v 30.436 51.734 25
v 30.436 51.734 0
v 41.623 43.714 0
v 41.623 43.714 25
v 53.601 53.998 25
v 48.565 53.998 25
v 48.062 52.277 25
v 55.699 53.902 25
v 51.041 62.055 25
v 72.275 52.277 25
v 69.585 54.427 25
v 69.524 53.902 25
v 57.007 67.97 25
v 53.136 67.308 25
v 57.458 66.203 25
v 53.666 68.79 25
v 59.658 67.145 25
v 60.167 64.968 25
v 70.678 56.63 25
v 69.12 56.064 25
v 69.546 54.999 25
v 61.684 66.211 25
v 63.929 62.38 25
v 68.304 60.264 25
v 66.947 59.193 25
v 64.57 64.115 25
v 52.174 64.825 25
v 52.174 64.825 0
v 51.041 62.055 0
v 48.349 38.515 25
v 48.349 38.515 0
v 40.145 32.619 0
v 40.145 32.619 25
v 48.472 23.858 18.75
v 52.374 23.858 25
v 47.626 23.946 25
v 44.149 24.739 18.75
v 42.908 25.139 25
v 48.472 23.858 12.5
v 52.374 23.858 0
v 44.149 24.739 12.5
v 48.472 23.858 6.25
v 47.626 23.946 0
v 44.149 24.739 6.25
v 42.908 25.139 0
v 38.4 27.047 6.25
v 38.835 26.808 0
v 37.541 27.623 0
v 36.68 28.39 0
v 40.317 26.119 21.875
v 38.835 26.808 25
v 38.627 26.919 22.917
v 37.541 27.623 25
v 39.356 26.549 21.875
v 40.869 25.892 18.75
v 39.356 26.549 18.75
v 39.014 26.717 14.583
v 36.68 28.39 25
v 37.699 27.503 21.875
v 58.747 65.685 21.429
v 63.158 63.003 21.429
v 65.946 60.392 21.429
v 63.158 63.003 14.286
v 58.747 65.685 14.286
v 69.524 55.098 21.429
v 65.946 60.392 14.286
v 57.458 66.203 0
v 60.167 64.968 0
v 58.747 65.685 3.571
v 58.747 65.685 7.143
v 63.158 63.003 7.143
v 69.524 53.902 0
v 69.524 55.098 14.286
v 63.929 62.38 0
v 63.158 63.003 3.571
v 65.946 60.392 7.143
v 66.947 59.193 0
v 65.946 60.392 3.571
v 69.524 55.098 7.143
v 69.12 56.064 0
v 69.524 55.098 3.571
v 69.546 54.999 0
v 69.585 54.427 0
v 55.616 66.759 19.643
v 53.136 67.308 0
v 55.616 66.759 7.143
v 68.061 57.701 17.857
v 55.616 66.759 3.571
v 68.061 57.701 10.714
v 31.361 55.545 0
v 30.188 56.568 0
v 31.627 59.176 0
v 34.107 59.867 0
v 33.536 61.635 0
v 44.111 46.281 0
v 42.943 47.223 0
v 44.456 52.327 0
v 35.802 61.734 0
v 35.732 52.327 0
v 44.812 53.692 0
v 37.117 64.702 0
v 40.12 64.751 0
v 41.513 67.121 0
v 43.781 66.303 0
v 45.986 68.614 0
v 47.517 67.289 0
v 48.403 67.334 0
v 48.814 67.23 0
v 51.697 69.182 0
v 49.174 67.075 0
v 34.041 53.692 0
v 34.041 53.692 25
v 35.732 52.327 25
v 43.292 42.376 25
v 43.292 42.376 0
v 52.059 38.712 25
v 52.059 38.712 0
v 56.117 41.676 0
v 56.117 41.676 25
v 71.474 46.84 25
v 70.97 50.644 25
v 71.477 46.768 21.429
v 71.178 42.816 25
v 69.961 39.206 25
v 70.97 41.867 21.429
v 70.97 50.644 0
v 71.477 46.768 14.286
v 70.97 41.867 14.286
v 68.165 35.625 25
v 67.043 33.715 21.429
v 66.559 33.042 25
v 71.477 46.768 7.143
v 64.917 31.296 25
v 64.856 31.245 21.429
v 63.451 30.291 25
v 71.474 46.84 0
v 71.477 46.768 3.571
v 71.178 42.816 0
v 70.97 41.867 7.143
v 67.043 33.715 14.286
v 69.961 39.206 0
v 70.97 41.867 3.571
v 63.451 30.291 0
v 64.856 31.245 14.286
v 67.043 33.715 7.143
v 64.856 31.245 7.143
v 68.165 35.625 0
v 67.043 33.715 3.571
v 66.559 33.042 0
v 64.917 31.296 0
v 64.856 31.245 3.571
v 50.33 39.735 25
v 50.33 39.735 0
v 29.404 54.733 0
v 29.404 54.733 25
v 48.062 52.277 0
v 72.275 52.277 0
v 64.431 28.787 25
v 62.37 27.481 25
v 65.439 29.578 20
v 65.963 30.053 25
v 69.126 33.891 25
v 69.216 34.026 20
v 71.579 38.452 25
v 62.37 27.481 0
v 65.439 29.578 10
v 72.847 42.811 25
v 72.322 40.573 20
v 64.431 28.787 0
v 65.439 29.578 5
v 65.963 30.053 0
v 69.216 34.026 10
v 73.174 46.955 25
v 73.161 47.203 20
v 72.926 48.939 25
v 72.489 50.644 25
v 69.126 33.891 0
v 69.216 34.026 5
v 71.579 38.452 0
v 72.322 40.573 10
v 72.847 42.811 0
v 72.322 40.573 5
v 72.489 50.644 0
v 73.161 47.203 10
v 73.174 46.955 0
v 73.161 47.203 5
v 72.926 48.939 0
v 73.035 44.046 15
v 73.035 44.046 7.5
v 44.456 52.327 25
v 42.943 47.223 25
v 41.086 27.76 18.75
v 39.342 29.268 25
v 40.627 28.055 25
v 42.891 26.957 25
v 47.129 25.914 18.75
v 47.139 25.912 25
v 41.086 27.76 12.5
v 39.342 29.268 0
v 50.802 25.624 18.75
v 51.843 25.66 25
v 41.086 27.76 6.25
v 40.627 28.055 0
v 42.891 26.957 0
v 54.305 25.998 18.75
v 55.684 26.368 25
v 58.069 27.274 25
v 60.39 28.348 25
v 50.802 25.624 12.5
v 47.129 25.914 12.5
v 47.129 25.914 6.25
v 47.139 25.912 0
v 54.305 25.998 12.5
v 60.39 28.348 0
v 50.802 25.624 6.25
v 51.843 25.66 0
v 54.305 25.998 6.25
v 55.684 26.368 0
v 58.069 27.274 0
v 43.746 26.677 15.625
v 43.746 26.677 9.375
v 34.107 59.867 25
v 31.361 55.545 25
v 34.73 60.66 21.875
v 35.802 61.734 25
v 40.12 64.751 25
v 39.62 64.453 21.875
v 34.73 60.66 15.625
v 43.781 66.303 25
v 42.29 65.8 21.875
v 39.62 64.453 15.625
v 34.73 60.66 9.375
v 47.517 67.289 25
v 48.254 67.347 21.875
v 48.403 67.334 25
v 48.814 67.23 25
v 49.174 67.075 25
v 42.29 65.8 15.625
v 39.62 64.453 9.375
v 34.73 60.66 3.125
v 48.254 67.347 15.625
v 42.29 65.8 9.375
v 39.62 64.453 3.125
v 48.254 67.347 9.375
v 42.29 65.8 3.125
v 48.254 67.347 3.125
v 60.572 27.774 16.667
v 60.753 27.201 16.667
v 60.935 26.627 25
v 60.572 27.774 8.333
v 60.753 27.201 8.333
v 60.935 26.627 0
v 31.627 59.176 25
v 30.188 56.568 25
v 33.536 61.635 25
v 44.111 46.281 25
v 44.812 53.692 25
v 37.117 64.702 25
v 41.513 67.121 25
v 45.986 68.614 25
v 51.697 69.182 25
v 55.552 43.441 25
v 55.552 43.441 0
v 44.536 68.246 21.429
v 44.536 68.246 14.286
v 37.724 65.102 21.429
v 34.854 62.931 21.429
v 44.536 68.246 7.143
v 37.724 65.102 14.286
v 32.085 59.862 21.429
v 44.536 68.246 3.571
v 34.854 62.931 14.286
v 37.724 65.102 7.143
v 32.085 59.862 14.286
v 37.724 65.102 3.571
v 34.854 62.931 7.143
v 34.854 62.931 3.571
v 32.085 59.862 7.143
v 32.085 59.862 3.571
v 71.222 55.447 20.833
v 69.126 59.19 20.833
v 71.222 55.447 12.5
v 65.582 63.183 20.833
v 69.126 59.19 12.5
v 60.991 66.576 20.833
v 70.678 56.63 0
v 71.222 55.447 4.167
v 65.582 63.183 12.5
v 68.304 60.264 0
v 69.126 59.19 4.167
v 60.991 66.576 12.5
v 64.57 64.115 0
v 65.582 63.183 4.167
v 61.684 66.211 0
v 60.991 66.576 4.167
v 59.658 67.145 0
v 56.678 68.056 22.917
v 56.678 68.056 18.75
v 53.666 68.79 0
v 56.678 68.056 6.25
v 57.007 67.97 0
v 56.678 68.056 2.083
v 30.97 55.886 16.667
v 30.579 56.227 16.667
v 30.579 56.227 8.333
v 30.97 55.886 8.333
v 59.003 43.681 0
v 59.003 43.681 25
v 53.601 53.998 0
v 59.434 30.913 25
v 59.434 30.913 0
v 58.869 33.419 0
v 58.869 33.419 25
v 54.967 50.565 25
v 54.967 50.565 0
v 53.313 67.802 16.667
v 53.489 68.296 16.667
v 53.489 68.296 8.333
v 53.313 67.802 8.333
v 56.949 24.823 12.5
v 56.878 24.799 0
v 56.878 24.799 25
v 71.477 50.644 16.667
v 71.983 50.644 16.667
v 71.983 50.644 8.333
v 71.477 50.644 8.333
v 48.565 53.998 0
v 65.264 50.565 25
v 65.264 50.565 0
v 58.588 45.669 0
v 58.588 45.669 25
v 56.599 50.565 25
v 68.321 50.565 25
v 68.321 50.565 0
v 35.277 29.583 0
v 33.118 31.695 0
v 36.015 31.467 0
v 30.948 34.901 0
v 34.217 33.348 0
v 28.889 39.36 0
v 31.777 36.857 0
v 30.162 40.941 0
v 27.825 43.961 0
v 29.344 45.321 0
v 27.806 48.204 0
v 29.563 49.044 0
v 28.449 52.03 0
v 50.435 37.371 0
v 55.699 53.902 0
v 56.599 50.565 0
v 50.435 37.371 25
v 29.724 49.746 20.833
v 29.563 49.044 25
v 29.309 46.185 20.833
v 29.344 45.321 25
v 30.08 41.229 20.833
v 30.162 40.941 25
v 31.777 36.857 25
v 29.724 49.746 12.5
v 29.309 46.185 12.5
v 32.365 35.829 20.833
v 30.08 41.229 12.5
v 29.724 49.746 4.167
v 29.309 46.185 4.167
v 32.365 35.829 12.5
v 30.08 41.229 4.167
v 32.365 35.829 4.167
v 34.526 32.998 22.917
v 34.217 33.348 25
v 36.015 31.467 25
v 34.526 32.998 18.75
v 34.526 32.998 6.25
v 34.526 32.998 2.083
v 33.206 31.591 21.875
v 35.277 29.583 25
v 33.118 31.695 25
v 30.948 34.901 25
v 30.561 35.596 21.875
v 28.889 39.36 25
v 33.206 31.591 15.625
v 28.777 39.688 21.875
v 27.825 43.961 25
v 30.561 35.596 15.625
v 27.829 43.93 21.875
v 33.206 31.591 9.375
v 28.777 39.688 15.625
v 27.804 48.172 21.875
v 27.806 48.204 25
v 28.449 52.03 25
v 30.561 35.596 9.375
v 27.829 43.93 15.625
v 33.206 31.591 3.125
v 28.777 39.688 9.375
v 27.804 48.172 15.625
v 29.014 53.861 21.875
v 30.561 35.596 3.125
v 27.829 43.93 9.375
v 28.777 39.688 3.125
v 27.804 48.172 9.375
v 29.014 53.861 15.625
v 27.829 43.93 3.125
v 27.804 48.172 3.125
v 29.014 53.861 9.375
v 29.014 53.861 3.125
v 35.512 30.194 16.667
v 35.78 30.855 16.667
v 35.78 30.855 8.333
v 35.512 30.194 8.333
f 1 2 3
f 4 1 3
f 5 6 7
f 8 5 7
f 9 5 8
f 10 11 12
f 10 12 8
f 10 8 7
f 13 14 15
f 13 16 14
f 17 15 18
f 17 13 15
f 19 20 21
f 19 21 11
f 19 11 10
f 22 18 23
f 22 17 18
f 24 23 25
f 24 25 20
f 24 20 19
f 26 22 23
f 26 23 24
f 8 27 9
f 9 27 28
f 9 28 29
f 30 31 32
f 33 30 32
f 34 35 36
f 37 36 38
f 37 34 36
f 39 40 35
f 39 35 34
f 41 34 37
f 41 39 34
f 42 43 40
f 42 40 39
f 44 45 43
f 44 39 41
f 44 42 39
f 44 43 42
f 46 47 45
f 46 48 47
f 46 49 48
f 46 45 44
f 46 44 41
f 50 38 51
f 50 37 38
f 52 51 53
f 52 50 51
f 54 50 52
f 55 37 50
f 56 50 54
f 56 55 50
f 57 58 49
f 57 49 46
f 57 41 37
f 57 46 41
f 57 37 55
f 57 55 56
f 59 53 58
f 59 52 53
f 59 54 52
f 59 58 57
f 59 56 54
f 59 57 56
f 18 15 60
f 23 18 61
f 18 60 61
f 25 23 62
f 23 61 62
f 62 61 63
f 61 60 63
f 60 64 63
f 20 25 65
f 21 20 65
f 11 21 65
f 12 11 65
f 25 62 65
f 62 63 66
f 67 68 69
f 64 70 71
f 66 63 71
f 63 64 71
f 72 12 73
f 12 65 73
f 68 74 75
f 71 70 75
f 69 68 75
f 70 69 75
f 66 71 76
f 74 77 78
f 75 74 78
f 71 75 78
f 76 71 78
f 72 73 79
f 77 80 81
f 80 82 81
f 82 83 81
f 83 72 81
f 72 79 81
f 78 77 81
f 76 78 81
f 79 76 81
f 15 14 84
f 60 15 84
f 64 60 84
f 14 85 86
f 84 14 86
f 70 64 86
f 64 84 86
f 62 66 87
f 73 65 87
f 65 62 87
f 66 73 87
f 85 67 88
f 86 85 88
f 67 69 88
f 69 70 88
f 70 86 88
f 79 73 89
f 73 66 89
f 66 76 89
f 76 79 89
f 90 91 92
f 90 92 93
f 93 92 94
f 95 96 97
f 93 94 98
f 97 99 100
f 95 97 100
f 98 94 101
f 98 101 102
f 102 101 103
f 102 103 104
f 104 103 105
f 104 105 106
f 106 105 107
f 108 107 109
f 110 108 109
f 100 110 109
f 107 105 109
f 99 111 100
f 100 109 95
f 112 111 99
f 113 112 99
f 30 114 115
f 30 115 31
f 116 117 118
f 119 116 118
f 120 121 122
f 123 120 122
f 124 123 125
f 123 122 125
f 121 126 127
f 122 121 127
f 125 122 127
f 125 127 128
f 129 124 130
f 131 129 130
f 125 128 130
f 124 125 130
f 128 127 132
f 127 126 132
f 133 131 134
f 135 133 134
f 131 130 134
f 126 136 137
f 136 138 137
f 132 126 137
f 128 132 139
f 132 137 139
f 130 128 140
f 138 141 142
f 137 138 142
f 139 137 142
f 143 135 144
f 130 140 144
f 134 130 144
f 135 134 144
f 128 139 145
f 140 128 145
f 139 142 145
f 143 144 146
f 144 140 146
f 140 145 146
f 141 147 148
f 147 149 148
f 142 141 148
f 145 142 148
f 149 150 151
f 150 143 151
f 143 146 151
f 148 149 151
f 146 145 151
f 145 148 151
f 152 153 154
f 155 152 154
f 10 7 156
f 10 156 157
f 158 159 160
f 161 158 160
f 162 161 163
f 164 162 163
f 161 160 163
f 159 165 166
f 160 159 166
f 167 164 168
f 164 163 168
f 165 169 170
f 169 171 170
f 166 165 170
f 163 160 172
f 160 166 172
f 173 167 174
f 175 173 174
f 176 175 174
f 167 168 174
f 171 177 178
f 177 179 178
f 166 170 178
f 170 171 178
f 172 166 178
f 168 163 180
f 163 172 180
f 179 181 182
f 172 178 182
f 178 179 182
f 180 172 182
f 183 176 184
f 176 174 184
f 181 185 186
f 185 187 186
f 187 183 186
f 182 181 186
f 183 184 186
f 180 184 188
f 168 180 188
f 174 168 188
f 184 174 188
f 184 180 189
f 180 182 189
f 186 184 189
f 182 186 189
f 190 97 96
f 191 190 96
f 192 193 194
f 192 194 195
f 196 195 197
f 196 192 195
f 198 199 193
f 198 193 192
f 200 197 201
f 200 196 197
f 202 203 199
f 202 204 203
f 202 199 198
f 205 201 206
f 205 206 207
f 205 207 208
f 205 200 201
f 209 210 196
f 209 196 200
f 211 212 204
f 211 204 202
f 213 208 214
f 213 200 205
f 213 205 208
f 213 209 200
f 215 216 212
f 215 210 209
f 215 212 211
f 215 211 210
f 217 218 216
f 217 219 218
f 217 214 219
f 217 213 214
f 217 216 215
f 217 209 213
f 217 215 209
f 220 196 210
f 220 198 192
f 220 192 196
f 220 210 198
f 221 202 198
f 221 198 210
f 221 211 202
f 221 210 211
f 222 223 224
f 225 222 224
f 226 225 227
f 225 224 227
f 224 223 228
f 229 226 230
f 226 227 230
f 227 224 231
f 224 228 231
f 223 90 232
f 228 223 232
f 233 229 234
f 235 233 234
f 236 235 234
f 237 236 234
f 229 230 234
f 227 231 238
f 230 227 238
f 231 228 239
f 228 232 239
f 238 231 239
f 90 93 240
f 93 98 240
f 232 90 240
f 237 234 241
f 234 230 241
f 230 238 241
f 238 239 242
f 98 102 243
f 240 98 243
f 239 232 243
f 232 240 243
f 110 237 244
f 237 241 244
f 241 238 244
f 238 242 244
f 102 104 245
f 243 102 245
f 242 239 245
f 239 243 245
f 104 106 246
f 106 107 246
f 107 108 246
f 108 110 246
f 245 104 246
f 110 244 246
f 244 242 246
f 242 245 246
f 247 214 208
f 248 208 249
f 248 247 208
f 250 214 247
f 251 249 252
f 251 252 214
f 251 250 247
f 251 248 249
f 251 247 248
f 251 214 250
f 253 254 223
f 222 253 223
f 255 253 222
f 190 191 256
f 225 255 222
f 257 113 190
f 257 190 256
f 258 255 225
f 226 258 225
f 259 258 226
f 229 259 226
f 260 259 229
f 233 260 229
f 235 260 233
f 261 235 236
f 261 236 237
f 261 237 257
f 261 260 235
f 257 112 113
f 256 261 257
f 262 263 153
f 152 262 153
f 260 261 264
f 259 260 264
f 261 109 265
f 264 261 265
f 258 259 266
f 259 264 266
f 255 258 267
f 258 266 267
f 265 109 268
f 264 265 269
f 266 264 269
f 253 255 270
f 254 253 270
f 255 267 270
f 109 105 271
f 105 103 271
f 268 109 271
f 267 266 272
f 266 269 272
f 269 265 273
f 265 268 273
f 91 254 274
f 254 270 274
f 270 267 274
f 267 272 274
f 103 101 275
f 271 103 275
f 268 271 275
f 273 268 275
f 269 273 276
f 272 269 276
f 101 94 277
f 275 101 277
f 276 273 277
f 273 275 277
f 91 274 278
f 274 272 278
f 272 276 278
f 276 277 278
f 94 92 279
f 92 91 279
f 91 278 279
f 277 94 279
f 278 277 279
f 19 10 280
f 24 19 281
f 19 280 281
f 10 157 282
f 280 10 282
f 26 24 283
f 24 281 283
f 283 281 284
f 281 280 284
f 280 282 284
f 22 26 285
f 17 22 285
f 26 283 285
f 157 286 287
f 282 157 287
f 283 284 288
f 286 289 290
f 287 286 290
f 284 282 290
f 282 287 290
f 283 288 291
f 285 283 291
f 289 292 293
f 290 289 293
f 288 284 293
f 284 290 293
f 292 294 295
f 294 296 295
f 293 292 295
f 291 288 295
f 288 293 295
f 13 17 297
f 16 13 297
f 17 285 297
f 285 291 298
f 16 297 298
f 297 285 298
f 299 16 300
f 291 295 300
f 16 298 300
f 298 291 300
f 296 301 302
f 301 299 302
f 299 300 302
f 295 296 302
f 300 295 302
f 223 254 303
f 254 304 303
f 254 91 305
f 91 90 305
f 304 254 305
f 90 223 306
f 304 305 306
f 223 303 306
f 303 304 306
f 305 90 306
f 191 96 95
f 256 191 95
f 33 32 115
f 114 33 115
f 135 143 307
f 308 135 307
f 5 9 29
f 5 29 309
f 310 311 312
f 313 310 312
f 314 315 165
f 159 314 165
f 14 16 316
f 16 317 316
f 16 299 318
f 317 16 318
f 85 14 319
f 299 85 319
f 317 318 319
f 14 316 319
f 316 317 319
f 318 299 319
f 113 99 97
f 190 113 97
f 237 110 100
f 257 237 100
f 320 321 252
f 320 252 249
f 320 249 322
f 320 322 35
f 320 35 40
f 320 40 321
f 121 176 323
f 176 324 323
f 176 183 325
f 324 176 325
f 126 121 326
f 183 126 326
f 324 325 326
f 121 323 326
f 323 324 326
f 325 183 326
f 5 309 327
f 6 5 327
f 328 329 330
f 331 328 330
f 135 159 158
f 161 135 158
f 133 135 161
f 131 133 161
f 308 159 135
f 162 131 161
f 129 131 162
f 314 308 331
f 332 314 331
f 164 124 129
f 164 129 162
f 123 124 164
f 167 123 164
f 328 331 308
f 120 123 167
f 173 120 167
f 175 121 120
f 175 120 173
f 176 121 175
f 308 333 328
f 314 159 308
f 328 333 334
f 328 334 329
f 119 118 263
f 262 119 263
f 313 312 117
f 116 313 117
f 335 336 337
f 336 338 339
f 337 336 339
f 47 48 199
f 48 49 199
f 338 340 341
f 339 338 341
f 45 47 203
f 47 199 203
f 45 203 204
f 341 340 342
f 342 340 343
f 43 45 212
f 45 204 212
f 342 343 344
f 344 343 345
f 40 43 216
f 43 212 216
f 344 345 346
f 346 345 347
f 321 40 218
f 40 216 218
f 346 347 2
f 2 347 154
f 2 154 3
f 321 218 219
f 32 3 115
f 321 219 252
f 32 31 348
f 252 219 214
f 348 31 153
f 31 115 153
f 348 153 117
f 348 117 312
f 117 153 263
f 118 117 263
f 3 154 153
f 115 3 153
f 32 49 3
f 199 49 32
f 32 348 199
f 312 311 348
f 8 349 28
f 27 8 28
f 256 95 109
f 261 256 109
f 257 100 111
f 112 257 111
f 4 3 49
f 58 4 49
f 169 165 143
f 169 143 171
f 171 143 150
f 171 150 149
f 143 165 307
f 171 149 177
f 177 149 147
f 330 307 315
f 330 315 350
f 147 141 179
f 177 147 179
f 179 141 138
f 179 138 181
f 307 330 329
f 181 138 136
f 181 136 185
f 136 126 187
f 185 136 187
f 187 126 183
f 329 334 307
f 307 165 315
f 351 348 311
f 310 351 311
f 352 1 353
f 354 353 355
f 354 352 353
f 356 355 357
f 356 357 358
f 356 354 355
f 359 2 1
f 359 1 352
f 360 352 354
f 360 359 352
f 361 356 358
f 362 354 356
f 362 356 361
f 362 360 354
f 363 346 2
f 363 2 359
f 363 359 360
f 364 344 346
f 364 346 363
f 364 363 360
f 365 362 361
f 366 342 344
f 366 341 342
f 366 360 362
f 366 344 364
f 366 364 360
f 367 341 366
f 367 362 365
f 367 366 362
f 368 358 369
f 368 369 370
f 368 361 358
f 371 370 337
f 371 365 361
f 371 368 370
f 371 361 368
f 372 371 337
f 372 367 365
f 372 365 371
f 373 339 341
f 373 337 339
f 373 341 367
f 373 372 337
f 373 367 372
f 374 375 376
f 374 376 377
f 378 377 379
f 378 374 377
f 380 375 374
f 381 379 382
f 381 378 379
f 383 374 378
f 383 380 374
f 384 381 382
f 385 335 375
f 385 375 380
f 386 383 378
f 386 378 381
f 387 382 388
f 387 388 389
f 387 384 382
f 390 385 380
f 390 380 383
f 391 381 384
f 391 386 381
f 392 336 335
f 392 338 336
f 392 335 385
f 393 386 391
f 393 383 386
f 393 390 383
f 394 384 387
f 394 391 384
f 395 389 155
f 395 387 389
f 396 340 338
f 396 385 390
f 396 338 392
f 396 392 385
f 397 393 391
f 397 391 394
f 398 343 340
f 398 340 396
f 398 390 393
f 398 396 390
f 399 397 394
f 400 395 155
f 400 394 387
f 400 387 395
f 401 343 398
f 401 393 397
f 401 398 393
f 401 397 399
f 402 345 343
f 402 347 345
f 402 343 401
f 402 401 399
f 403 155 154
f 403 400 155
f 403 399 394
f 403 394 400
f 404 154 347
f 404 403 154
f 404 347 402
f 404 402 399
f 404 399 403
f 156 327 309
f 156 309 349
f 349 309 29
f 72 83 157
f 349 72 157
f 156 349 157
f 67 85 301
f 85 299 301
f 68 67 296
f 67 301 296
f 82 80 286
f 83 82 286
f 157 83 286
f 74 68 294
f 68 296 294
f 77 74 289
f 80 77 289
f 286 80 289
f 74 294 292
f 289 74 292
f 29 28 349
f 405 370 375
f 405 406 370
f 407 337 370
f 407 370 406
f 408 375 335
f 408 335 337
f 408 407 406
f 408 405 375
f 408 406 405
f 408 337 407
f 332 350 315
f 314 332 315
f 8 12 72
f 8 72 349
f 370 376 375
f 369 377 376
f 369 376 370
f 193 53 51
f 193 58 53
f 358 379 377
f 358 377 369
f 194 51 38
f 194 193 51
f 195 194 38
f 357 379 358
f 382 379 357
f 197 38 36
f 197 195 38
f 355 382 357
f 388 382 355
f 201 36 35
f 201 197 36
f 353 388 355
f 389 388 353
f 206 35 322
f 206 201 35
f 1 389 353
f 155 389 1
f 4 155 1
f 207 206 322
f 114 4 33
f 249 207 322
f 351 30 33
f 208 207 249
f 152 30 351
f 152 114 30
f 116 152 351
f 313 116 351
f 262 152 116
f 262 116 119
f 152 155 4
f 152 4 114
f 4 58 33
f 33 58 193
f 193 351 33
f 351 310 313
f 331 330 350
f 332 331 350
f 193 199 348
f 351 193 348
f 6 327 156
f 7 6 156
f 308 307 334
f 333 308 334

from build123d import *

# Parameters (mm, degrees)
F1_DEPTH = 25


with BuildPart() as f1:
    # F0 (on Top) → F1 (new body)
    with BuildSketch(Plane.XY):
        with BuildLine():
            Line((44.812258333, 53.6919422448), (34.0407192707, 53.6919422448))
            Line((34.0407192707, 53.6919422448), (35.7321165502, 52.3269511759))
            Line((35.7321165502, 52.3269511759), (44.4561727345, 52.3269511759))
            Line((44.4561727345, 52.3269511759), (42.9428182542, 47.2230836749))
            Line((42.9428182542, 47.2230836749), (44.1105565273, 46.2806957848))
            Line((44.1105565273, 46.2806957848), (51.6965389252, 69.1815912724))
            add(Edge.make_bspline(
                [(51.6965389252, 69.1815912724), (50.4524167957, 69.1326907756), (47.9916665589, 69.0359704409), (44.5043196657, 68.3534366475), (40.9343896774, 66.9433489012), (37.6690042438, 65.1660846742), (34.7794950211, 63.0230780666), (31.9254353452, 59.9570685381), (30.7591780724, 57.6817069711), (30.1883090287, 56.5679445863)],
                knots=[0, 0, 0, 0, 0.141829807, 0.280525298, 0.4246980025, 0.5664568968, 0.7063255794, 0.8562498691, 1, 1, 1, 1], degree=3))
            add(Edge.make_bspline(
                [(30.1883090287, 56.5679445863), (30.5792316794, 56.2269277871), (30.9701543301, 55.8859109879), (31.3610769808, 55.5448941886)],
                knots=[0, 0, 0, 0, 1.556283003, 1.556283003, 1.556283003, 1.556283003], degree=3))
            add(Edge.make_bspline(
                [(31.3610769808, 55.5448941886), (31.8123828744, 56.2881030808), (32.7685179804, 57.8626628703), (34.6352677549, 60.7932269306), (36.7464478269, 62.5500640142), (39.630096623, 64.5288575104), (42.2205175361, 65.9076551519), (45.6950339888, 66.8367151988), (48.1933683323, 67.5313041772), (48.9026289807, 67.2011968442), (49.1742864251, 67.0747607946)],
                knots=[0, 0, 0, 0, 0.1248096143, 0.2644212175, 0.3908159069, 0.5305584177, 0.6613881458, 0.806480541, 0.9258791506, 1, 1, 1, 1], degree=3))
            Line((49.1742864251, 67.0747607946), (44.812258333, 53.6919422448))
        make_face()
    extrude(amount=F1_DEPTH)


with BuildPart() as f1b:
    # F0 (on Top) → F1, piece 2 (new body)
    with BuildSketch(Plane.XY):
        with BuildLine():
            add(Edge.make_bspline(
                [(53.1362332404, 67.3081129789), (53.805422693, 67.1736089456), (55.3470800415, 66.8637428372), (58.8942423551, 65.8566676892), (63.2610501005, 63.122957783), (65.9726265765, 60.4977915099), (68.1664452008, 57.6343306219), (69.7199103296, 55.2121023161), (69.5799109872, 54.2748790238), (69.5241987705, 53.9019145072)],
                knots=[0, 0, 0, 0, 0.1198400828, 0.2760837661, 0.4610761717, 0.6202053237, 0.7761973745, 0.9109385792, 1, 1, 1, 1], degree=3))
            Line((69.5241987705, 53.9019145072), (55.6991249323, 53.9019145072))
            Line((55.6991249323, 53.9019145072), (52.174076438, 64.824745059))
            Line((52.174076438, 64.824745059), (51.0410219431, 62.0550625026))
            Line((51.0410219431, 62.0550625026), (53.6008812487, 53.9978034794))
            Line((53.6008812487, 53.9978034794), (48.5650934279, 53.9978034794))
            Line((48.5650934279, 53.9978034794), (48.0615161359, 52.2772409022))
            Line((48.0615161359, 52.2772409022), (72.2752586007, 52.2772409022))
            add(Edge.make_bspline(
                [(72.2752586007, 52.2772409022), (71.9727730122, 53.323374444), (71.328464913, 55.5472415212), (69.2366943604, 59.3717587308), (65.6303200693, 63.3062582454), (61.3428911528, 66.8988200534), (55.990384948, 68.2225911218), (54.3947660828, 68.6442913779), (53.6655560136, 68.7902122736)],
                knots=[0, 0, 0, 0, 0.1469949421, 0.3135672082, 0.4993787693, 0.6915439213, 0.8770971154, 1, 1, 1, 1], degree=3))
            add(Edge.make_bspline(
                [(53.6655560136, 68.7902122736), (53.4891150892, 68.2961791754), (53.3126741648, 67.8021460772), (53.1362332404, 67.3081129789)],
                knots=[0, 0, 0, 0, 1.5737855373, 1.5737855373, 1.5737855373, 1.5737855373], degree=3))
        make_face()
    extrude(amount=F1_DEPTH)


with BuildPart() as f1c:
    # F0 (on Top) → F1, piece 3 (new body)
    with BuildSketch(Plane.XY):
        with BuildLine():
            add(Edge.make_bspline(
                [(70.970416069, 50.6441369653), (71.0542201125, 50.0577893936), (71.2304266253, 48.8249340725), (71.6167848414, 46.7213634913), (71.2507489047, 41.6253196409), (69.3062637751, 37.9653684349), (67.2820029718, 33.6878776048), (64.9871707696, 31.2099657821), (63.9032899491, 30.5614621616), (63.4505078197, 30.2905552089)],
                knots=[0, 0, 0, 0, 0.1072299161, 0.2254617892, 0.404644868, 0.5724728673, 0.7481628192, 0.8947971282, 1, 1, 1, 1], degree=3))
            Line((63.4505078197, 30.2905552089), (59.0029843152, 43.6811223626))
            Line((59.0029843152, 43.6811223626), (68.3205127716, 50.5654104054))
            Line((68.3205127716, 50.5654104054), (65.2641281486, 50.5654104054))
            Line((65.2641281486, 50.5654104054), (58.5875548422, 45.6692576408))
            Line((58.5875548422, 45.6692576408), (56.599419564, 50.5654104054))
            Line((56.599419564, 50.5654104054), (54.9673698843, 50.5654104054))
            Line((54.9673698843, 50.5654104054), (62.3701885343, 27.4814460427))
            add(Edge.make_bspline(
                [(62.3701885343, 27.4814460427), (63.3883263261, 28.0838934031), (65.6822055578, 29.4412160555), (69.5182476955, 34.0156317376), (72.6921126886, 40.2964372928), (73.4832386185, 47.1184374266), (72.7833526751, 49.6012378795), (72.4893659353, 50.6441369653)],
                knots=[0, 0, 0, 0, 0.1677436685, 0.3779289212, 0.6121406827, 0.8370798882, 1, 1, 1, 1], degree=3))
            add(Edge.make_bspline(
                [(72.4893659353, 50.6441369653), (71.9830493132, 50.6441369653), (71.4767326911, 50.6441369653), (70.970416069, 50.6441369653)],
                knots=[0, 0, 0, 0, 1.5189498663, 1.5189498663, 1.5189498663, 1.5189498663], degree=3))
        make_face()
    extrude(amount=F1_DEPTH)


with BuildPart() as f1d:
    # F0 (on Top) → F1, piece 4 (new body)
    with BuildSketch(Plane.XY):
        with BuildLine():
            Line((50.3295138478, 39.7354476154), (29.4036548585, 54.7329001129))
            add(Edge.make_bspline(
                [(35.2768823504, 29.5825470239), (34.5953557089, 30.1689778429), (33.0348159571, 31.511769964), (30.4122885629, 35.6018590943), (28.6670664269, 39.6180448915), (27.648116989, 43.861493984), (27.7258271406, 48.1650546958), (28.1634910451, 51.1466606702), (28.9492012566, 53.8240337642), (29.2800994394, 54.4858003823), (29.4036548585, 54.7329001129)],
                knots=[0, 0, 0, 0, 0.1168543702, 0.267569716, 0.4129259268, 0.5563547188, 0.6980470506, 0.8199667924, 0.932776668, 1, 1, 1, 1], degree=3))
            add(Edge.make_bspline(
                [(36.0148325562, 31.4668603241), (35.8170072238, 30.9129512558), (35.4747076829, 30.1364560922), (35.2768823504, 29.5825470239)],
                knots=[0, 0, 0, 0, 2.0236618096, 2.0236618096, 2.0236618096, 2.0236618096], degree=3))
            add(Edge.make_bspline(
                [(30.4361861199, 51.7339669168), (30.1805966062, 51.1208028326), (29.5919977728, 49.7087430838), (29.0928348623, 46.0359488105), (29.9037246045, 41.1334314692), (31.9826316615, 35.8428822775), (34.9335767022, 32.5068932295), (35.7275815007, 31.7431599148), (36.0148325562, 31.4668603241)],
                knots=[0, 0, 0, 0, 0.1290543899, 0.2972002341, 0.4960780388, 0.7111289915, 0.895493702, 1, 1, 1, 1], degree=3))
            Line((30.4361861199, 51.7339669168), (41.6227099965, 43.7136054443))
            Line((41.6227099965, 43.7136054443), (36.6795249283, 28.3897165209))
            add(Edge.make_bspline(
                [(52.3743927479, 23.8575097173), (51.0614679962, 23.807842649), (48.3526931094, 23.7053715002), (44.236812335, 24.5618832512), (38.3426499213, 26.7899094326), (37.1308751204, 27.9555499732), (36.6795249283, 28.3897165209)],
                knots=[0, 0, 0, 0, 0.2456456361, 0.5068064482, 0.8163000219, 1, 1, 1, 1], degree=3))
            add(Edge.make_bspline(
                [(60.935229063, 26.6271922737), (59.6440624425, 25.9359839252), (56.997695994, 24.6385937328), (53.9674161578, 24.0139735878), (52.3743927479, 23.8575097173)],
                knots=[0, 0, 0, 0, 0.4917427521, 1, 1, 1, 1], degree=3))
            add(Edge.make_bspline(
                [(60.3896863759, 28.3477529883), (60.5715339382, 27.7742327501), (60.7533815006, 27.2007125119), (60.935229063, 26.6271922737)],
                knots=[0, 0, 0, 0, 1.8049781151, 1.8049781151, 1.8049781151, 1.8049781151], degree=3))
            add(Edge.make_bspline(
                [(39.3422837332, 29.268374226), (39.8027171176, 28.7533059602), (41.0254368569, 27.3854986791), (47.3124949282, 25.5440707407), (54.385446473, 25.4835376413), (58.4203731205, 27.4083272924), (60.3896863759, 28.3477529883)],
                knots=[0, 0, 0, 0, 0.1638784122, 0.4351929644, 0.724336505, 1, 1, 1, 1], degree=3))
            Line((39.3422837332, 29.268374226), (50.4353754222, 37.371147424))
            Line((50.4353754222, 37.371147424), (59.4338476658, 30.9134200215))
            Line((59.4338476658, 30.9134200215), (58.8692389429, 33.4188751876))
            Line((58.8692389429, 33.4188751876), (52.0586296916, 38.7120917439))
            Line((52.0586296916, 38.7120917439), (56.1167672276, 41.6762940586))
            Line((56.1167672276, 41.6762940586), (55.5521547794, 43.4407033026))
            Line((55.5521547794, 43.4407033026), (50.3295138478, 39.7354476154))
        make_face()
        Polygon((48.349045217, 38.5147407651), (40.1449091733, 32.6186716557), (43.292272836, 42.3755086958), align=None, mode=Mode.SUBTRACT)
    extrude(amount=F1_DEPTH)


solid = Compound([f1.part, f1b.part, f1c.part, f1d.part])
